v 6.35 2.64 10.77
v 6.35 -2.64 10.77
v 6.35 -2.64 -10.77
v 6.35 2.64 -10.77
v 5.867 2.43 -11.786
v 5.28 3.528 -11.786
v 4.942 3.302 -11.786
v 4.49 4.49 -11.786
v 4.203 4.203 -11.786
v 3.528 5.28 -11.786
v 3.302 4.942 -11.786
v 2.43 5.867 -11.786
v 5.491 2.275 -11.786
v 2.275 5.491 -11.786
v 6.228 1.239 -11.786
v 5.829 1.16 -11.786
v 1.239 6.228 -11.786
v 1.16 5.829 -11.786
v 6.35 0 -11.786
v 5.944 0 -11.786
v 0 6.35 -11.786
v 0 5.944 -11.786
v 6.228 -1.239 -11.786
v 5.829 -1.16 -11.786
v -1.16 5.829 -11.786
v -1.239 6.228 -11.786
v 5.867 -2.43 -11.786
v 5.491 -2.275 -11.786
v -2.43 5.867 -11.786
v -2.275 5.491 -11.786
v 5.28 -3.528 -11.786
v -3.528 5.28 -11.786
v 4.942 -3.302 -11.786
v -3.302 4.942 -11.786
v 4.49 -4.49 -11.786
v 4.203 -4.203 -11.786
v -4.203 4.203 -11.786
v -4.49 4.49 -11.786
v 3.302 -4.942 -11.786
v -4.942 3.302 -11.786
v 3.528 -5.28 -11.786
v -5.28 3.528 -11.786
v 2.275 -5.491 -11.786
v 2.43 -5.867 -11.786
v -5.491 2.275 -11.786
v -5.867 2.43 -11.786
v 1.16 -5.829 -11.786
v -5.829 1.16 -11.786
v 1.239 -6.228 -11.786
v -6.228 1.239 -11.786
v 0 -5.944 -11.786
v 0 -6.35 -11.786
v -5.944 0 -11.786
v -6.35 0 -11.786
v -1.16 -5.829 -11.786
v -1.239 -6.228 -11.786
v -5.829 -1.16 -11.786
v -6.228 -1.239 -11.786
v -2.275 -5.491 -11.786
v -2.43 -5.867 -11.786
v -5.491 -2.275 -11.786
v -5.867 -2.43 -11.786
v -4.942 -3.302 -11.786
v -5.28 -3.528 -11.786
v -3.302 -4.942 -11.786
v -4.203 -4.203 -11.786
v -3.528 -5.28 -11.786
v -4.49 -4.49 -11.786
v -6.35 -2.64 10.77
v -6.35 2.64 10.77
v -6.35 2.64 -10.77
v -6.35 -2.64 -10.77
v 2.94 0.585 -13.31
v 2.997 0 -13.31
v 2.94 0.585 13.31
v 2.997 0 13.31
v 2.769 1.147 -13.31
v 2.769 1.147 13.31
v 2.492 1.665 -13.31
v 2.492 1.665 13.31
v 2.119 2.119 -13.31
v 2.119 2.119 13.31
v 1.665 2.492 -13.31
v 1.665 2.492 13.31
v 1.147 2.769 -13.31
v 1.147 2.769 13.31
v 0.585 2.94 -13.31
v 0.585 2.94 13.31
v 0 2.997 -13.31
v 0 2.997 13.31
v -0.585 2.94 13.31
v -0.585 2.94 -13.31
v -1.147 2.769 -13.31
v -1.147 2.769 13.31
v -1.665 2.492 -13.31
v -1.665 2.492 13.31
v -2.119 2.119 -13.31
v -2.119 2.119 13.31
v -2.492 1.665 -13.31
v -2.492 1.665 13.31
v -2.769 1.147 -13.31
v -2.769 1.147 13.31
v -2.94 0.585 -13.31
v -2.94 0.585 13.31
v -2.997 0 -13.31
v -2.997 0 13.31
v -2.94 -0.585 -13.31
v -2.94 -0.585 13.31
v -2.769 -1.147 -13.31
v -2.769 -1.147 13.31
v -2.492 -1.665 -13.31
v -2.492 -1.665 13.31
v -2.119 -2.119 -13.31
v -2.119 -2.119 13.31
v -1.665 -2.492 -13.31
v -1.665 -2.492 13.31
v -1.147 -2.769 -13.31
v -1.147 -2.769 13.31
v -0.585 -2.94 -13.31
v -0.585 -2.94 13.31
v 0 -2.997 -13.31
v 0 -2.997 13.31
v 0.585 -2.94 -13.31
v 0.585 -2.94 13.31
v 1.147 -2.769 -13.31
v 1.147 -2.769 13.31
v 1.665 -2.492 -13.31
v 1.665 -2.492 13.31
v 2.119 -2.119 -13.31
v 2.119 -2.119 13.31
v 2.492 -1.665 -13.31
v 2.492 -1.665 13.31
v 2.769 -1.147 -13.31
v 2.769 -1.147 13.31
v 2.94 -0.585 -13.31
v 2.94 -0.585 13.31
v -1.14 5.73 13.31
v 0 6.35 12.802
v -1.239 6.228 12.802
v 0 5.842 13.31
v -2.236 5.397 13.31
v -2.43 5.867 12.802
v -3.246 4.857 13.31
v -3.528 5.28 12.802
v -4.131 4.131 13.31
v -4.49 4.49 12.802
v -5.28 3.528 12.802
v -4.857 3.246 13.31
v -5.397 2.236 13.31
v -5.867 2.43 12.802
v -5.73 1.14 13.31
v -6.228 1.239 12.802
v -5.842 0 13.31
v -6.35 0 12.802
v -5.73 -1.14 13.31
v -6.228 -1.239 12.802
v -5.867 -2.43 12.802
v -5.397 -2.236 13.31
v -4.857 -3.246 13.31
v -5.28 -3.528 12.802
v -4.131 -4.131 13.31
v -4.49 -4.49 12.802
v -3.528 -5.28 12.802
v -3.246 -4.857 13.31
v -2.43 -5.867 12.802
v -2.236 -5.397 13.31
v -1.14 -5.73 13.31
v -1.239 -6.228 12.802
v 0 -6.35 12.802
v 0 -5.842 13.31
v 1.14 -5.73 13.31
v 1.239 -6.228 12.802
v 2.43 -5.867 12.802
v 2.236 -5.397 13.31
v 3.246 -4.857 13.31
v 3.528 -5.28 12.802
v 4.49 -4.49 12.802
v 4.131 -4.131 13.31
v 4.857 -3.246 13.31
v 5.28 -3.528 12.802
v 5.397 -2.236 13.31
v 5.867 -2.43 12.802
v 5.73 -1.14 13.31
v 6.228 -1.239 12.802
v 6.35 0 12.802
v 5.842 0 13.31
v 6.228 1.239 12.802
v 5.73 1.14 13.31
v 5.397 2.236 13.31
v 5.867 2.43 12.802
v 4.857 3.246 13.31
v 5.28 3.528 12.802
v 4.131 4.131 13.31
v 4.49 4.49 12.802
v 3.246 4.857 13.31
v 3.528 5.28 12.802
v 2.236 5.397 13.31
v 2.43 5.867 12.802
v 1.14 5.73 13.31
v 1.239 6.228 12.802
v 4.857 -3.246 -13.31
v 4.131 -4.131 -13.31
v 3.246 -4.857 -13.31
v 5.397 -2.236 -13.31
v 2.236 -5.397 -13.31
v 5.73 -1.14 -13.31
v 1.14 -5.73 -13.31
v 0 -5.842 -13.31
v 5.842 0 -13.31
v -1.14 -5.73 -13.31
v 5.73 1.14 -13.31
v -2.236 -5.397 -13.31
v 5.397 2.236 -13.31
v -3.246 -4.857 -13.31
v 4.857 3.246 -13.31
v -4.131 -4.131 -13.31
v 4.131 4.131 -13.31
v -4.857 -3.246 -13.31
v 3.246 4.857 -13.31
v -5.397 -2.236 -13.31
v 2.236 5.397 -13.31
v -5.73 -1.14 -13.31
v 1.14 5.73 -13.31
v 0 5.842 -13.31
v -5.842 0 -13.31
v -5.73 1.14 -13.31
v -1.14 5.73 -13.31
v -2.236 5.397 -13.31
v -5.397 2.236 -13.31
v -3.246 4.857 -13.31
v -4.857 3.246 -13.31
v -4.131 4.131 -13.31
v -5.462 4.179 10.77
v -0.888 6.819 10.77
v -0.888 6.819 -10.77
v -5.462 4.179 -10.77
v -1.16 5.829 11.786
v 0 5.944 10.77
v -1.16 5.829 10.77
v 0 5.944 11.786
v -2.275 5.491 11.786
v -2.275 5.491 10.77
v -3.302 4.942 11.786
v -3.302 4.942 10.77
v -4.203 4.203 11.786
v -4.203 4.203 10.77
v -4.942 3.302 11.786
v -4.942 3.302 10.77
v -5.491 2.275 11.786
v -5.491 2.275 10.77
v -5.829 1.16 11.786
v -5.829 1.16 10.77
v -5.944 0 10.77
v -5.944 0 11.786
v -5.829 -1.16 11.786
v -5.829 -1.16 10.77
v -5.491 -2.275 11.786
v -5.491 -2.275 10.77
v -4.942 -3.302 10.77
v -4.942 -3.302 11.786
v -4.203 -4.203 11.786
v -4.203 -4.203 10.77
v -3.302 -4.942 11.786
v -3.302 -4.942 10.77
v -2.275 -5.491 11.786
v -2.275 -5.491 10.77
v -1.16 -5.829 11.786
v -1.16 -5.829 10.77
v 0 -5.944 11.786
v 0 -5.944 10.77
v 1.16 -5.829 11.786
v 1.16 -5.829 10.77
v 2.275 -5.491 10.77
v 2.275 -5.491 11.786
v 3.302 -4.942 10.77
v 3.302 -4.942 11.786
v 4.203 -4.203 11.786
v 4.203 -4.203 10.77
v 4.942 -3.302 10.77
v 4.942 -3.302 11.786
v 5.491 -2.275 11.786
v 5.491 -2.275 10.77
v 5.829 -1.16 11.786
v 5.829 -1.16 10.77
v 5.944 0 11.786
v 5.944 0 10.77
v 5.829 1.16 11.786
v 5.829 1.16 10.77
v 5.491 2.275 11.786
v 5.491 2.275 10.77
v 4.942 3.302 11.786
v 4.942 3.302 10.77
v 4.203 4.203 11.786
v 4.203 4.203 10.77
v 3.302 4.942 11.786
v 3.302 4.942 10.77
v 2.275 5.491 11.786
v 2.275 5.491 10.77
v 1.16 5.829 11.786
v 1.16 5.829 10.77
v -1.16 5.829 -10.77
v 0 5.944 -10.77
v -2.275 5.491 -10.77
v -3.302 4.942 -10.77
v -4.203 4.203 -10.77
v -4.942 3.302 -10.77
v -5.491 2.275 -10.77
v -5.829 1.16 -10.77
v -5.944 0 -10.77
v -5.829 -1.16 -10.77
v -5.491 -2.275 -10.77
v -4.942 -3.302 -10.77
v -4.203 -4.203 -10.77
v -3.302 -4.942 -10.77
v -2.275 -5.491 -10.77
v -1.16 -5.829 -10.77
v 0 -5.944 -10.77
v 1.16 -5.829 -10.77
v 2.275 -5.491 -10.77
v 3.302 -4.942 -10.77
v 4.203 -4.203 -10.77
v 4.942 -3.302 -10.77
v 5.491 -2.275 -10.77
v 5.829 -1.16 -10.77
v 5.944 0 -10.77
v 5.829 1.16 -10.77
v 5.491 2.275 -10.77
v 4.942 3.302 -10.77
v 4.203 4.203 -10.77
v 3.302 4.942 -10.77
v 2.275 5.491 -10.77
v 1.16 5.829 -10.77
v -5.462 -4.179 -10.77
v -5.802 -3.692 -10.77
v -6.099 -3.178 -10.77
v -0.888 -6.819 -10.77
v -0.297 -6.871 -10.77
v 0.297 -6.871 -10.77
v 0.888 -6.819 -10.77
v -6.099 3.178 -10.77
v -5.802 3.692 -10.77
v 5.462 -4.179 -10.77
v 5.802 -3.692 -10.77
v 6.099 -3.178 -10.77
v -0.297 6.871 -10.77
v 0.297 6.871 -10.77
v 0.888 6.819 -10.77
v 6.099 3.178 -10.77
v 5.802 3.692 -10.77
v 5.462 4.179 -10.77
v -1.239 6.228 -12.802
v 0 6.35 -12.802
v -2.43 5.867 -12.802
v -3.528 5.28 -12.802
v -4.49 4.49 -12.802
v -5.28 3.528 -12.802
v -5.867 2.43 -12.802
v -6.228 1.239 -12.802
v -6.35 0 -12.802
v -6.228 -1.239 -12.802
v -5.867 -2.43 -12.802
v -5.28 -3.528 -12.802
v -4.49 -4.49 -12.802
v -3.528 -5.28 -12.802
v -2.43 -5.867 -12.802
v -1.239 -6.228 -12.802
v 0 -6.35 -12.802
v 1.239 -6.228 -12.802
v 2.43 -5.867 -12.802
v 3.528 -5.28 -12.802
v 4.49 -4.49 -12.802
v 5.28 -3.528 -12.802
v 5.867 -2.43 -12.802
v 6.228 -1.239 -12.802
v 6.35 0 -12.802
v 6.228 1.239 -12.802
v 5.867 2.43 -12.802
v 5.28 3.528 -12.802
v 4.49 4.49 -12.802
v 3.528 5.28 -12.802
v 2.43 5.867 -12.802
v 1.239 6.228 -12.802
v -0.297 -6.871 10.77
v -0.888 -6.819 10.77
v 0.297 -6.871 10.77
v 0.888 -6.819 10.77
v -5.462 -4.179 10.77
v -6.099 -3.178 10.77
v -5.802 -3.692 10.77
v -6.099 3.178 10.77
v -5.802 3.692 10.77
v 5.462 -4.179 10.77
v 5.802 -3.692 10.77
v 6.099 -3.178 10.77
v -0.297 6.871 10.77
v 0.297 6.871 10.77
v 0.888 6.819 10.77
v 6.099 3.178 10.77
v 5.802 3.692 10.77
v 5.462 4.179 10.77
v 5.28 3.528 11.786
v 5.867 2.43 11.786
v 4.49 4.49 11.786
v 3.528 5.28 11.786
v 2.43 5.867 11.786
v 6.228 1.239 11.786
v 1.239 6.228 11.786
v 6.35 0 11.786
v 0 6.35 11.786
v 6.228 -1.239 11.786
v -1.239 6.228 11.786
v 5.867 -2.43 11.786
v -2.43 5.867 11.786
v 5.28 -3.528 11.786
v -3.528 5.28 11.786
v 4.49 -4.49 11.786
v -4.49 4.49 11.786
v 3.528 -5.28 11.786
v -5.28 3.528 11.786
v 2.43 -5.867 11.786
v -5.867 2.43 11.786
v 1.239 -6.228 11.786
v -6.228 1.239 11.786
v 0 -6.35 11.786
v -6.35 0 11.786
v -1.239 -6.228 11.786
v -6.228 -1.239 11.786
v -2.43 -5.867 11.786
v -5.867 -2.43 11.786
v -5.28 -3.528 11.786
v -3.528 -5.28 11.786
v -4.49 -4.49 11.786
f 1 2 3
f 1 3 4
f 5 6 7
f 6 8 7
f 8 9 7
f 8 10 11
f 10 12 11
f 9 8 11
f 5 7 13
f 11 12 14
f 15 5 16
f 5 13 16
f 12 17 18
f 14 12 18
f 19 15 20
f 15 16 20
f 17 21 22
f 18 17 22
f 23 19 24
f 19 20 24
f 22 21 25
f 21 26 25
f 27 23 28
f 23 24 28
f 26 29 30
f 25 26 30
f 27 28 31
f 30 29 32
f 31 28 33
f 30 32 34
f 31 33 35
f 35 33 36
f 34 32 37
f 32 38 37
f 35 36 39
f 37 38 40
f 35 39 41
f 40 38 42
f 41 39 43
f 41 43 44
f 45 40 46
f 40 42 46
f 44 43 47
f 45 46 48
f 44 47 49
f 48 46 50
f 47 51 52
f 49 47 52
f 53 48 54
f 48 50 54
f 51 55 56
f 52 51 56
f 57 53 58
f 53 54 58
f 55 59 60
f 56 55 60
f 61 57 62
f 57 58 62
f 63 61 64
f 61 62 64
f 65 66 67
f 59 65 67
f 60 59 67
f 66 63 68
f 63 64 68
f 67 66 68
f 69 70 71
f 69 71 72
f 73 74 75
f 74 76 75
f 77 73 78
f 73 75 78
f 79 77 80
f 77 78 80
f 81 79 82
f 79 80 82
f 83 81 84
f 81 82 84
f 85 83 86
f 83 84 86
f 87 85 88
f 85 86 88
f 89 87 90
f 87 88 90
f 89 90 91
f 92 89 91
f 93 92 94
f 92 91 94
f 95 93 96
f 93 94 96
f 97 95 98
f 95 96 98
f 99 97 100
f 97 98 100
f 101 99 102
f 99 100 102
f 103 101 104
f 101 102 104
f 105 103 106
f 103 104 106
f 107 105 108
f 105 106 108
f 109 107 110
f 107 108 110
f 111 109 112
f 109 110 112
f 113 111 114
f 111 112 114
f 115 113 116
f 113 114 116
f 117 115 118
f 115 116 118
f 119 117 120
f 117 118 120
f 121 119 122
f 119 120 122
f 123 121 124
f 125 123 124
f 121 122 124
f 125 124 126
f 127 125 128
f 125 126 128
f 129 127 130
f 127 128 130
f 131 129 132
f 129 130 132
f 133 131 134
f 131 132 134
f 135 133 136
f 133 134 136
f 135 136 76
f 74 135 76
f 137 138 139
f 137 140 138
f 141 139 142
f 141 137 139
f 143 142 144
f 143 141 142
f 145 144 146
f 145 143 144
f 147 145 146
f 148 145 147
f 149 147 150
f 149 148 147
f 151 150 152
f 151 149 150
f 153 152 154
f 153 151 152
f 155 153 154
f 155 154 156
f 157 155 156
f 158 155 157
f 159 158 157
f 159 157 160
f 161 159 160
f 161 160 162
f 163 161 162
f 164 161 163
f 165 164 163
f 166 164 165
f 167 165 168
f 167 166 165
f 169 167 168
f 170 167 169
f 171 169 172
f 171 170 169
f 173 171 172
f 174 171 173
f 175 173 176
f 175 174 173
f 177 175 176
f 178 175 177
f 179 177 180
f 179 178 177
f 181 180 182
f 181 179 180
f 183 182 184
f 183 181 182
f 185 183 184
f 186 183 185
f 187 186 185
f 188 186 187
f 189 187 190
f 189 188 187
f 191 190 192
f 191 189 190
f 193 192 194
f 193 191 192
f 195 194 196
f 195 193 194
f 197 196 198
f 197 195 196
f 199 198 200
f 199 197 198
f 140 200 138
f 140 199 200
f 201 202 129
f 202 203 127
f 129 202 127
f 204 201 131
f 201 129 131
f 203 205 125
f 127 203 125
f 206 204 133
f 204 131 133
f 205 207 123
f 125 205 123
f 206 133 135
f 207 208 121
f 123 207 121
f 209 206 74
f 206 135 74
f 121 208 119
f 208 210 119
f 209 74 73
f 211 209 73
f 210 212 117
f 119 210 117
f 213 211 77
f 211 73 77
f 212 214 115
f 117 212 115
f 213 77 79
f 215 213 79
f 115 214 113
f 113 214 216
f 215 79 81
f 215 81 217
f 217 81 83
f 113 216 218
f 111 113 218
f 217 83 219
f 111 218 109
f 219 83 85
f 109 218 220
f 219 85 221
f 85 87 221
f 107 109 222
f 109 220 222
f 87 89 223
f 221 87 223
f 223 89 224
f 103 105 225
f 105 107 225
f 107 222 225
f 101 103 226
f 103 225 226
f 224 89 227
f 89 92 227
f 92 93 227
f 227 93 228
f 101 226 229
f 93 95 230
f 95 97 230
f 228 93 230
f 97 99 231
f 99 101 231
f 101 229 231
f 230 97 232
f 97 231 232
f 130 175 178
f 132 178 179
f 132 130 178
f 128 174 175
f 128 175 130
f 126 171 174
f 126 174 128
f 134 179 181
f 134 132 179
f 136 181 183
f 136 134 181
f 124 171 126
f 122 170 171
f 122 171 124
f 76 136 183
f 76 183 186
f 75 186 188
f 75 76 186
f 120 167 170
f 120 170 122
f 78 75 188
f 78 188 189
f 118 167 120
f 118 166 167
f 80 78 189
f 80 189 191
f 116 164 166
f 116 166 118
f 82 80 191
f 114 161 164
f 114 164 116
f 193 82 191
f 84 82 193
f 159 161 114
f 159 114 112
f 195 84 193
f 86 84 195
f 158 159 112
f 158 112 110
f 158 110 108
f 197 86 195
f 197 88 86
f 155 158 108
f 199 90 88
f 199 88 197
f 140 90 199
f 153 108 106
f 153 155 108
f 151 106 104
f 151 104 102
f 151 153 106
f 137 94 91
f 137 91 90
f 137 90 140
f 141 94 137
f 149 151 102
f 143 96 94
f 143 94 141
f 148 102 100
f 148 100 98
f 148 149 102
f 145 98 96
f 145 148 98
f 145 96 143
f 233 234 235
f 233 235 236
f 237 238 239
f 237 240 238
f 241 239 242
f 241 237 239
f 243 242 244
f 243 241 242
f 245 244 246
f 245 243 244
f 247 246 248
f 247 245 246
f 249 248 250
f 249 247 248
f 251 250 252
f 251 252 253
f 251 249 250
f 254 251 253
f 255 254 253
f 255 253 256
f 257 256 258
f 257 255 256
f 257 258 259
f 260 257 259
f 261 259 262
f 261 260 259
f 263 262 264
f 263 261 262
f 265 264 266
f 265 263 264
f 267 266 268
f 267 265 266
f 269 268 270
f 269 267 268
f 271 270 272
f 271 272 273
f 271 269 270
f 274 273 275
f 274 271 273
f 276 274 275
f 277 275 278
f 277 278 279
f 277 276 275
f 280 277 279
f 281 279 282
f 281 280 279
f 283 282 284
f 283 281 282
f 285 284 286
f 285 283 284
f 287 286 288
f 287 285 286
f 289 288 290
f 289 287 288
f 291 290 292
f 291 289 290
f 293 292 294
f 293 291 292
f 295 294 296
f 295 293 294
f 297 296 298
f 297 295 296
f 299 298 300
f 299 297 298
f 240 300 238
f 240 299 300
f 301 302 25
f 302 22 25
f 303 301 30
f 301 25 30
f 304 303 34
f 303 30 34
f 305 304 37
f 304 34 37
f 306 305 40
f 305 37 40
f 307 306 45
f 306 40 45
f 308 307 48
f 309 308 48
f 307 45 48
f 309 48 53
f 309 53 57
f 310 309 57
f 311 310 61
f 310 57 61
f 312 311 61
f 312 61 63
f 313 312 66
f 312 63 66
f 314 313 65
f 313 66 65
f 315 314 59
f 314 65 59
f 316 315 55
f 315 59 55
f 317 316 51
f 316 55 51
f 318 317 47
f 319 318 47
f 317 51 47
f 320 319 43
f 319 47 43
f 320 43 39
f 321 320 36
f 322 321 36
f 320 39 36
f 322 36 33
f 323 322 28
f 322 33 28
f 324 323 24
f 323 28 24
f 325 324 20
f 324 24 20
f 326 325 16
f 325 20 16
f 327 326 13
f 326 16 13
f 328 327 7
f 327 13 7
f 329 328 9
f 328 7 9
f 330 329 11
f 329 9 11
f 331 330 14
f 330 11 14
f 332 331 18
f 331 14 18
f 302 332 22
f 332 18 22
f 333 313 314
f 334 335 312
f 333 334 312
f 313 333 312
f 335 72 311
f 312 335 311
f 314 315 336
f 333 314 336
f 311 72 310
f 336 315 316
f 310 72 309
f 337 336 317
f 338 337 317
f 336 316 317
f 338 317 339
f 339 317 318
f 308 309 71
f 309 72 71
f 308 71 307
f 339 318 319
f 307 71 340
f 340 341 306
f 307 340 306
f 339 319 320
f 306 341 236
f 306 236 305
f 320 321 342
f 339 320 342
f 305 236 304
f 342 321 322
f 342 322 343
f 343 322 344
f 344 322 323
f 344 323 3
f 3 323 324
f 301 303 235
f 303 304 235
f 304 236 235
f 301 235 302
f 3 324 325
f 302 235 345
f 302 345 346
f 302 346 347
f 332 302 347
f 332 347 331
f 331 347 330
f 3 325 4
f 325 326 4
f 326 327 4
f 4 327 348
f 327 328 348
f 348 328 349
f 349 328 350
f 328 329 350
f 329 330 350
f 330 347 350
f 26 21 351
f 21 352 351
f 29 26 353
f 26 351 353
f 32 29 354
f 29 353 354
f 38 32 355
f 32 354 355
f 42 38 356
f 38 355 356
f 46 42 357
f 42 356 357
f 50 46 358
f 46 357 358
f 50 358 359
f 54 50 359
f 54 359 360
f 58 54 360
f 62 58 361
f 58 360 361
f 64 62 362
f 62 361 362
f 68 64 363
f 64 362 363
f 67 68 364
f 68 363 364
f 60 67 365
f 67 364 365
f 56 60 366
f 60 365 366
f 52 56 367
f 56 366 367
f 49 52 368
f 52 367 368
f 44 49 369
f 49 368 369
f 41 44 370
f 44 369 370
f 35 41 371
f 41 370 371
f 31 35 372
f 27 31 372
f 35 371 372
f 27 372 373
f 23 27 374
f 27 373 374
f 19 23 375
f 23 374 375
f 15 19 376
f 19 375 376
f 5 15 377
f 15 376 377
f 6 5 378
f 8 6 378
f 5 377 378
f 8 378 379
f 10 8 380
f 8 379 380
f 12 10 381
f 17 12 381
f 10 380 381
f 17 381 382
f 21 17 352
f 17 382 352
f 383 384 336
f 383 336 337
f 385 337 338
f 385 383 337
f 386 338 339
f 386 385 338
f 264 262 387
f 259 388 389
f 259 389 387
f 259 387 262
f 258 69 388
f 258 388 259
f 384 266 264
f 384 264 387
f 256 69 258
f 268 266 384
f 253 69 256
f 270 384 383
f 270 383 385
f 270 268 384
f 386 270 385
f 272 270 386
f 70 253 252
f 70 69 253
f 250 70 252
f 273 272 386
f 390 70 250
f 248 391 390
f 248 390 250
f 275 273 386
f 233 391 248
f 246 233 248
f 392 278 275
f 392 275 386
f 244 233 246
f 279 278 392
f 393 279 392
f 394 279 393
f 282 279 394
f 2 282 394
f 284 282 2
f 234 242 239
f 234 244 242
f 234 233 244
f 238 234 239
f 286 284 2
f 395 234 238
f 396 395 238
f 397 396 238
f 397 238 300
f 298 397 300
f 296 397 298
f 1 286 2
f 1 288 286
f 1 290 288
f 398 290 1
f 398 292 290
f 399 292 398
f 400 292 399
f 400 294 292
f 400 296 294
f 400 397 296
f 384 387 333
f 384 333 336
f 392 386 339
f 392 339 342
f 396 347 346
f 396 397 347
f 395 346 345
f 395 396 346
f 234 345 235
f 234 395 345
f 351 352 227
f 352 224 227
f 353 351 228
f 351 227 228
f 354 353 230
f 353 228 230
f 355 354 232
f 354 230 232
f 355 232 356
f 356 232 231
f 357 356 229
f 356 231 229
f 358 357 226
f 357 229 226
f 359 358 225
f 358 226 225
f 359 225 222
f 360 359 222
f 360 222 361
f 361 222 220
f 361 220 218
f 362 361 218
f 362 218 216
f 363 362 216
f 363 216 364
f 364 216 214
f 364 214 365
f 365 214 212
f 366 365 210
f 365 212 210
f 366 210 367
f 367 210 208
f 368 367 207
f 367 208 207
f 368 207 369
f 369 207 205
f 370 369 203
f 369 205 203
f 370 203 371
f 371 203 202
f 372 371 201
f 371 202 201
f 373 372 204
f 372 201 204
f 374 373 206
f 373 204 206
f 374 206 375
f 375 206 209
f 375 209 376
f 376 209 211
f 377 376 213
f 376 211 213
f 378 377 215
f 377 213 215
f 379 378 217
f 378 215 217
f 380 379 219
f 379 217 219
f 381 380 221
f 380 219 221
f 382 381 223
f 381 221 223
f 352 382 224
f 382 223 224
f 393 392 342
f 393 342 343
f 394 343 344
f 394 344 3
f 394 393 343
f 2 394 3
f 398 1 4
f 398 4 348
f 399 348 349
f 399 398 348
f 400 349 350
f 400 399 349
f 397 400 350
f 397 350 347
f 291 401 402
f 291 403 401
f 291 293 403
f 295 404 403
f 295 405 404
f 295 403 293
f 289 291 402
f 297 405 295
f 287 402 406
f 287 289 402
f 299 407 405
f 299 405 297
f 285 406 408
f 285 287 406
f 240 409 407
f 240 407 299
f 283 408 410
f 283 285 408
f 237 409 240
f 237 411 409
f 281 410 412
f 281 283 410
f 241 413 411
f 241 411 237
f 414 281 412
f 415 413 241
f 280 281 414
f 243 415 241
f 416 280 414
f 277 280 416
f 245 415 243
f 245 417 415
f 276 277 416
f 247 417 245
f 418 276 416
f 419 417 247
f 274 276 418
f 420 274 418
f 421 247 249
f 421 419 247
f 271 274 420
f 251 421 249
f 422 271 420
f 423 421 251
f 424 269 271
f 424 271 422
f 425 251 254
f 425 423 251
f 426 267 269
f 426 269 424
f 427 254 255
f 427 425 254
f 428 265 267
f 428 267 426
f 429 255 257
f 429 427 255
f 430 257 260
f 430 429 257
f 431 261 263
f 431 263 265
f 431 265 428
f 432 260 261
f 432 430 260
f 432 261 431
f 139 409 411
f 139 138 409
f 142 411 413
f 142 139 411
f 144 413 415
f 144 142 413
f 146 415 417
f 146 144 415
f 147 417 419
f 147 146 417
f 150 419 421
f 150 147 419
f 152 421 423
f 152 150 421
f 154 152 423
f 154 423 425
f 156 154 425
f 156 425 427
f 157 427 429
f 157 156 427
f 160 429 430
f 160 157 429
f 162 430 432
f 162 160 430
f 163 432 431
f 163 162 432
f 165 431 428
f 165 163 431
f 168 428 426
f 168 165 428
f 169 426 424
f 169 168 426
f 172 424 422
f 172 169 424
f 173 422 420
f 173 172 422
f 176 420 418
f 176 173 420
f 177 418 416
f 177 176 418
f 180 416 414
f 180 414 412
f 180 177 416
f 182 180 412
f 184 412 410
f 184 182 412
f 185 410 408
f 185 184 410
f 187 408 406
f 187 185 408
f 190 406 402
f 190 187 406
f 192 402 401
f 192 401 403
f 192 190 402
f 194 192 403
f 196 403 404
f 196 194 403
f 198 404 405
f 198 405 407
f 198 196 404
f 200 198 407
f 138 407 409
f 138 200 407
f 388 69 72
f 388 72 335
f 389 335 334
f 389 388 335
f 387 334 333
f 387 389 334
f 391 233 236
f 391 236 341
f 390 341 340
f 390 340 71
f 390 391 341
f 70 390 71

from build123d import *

# Parameters (mm, degrees)
SKETCH1_R               = 6.35
BASIC_ROD_DEPTH         = 10.7696
BASIC_ROD_DEPTH_BACK    = 10.7696
THEX_DEPTH              = 10.7696
SKETCH2_R               = 2.9972
INTERNAL_CUT_DEPTH      = 14.3096
INTERNAL_CUT_DEPTH_BACK = 14.3096


with BuildPart() as part:
    # Sketch1 → Basic Rod (new body, two sides)
    with BuildSketch(Plane.XY) as basic_rod_sk:
        Circle(SKETCH1_R)
    extrude(amount=BASIC_ROD_DEPTH)
    extrude(basic_rod_sk.sketch, amount=-BASIC_ROD_DEPTH_BACK)

    # Sketch8 → THex (add, symmetric)
    with BuildSketch(Plane.XY):
        with BuildLine():
            Line((-0.888411378, 6.819423871), (-5.461588622, 4.179098758))
            ThreePointArc((-5.461588622, 4.179098758), (-5.955700003, 3.438525), (-6.35, 2.640325113))
            Line((-6.35, 2.640325113), (-6.35, -2.640325113))
            ThreePointArc((-6.35, -2.640325113), (-5.955700003, -3.438525), (-5.461588622, -4.179098758))
            Line((-5.461588622, -4.179098758), (-0.888411378, -6.819423871))
            ThreePointArc((-0.888411378, -6.819423871), (0, -6.87705), (0.888411378, -6.819423871))
            Line((0.888411378, -6.819423871), (5.461588622, -4.179098758))
            ThreePointArc((5.461588622, -4.179098758), (5.955700003, -3.438525), (6.35, -2.640325113))
            Line((6.35, -2.640325113), (6.35, 2.640325113))
            ThreePointArc((6.35, 2.640325113), (5.955700003, 3.438525), (5.461588622, 4.179098758))
            Line((5.461588622, 4.179098758), (0.888411378, 6.819423871))
            ThreePointArc((0.888411378, 6.819423871), (0, 6.87705), (-0.888411378, 6.819423871))
        make_face()
    extrude(amount=THEX_DEPTH, both=True)

    # Sketch7 → 1stSnapRing (revolve)
    with BuildSketch(Plane(origin=(0, 0, 0), x_dir=(0, 0, -1), z_dir=(1, 0, 0))):
        Polygon((-10.7696, 5.9436), (-11.7856, 5.9436), (-11.7856, 6.35), (-12.8016, 6.35), (-13.3096, 5.842), (-13.3096, 0), (-10.7696, 0), align=None)
    f_1stsnapring = revolve(axis=Axis((0, 0, -38.2778), (0, 0, 1)))

    # 2ndSnapRing: 1stSnapRing across plane
    add(f_1stsnapring.mirror(Plane.XY))

    # Sketch2 → Internal Cut (cut, two sides)
    with BuildSketch(Plane.XY) as internal_cut_sk:
        Circle(SKETCH2_R)
    extrude(amount=INTERNAL_CUT_DEPTH, mode=Mode.SUBTRACT)
    extrude(internal_cut_sk.sketch, amount=-INTERNAL_CUT_DEPTH_BACK, mode=Mode.SUBTRACT)


solid = part.part
